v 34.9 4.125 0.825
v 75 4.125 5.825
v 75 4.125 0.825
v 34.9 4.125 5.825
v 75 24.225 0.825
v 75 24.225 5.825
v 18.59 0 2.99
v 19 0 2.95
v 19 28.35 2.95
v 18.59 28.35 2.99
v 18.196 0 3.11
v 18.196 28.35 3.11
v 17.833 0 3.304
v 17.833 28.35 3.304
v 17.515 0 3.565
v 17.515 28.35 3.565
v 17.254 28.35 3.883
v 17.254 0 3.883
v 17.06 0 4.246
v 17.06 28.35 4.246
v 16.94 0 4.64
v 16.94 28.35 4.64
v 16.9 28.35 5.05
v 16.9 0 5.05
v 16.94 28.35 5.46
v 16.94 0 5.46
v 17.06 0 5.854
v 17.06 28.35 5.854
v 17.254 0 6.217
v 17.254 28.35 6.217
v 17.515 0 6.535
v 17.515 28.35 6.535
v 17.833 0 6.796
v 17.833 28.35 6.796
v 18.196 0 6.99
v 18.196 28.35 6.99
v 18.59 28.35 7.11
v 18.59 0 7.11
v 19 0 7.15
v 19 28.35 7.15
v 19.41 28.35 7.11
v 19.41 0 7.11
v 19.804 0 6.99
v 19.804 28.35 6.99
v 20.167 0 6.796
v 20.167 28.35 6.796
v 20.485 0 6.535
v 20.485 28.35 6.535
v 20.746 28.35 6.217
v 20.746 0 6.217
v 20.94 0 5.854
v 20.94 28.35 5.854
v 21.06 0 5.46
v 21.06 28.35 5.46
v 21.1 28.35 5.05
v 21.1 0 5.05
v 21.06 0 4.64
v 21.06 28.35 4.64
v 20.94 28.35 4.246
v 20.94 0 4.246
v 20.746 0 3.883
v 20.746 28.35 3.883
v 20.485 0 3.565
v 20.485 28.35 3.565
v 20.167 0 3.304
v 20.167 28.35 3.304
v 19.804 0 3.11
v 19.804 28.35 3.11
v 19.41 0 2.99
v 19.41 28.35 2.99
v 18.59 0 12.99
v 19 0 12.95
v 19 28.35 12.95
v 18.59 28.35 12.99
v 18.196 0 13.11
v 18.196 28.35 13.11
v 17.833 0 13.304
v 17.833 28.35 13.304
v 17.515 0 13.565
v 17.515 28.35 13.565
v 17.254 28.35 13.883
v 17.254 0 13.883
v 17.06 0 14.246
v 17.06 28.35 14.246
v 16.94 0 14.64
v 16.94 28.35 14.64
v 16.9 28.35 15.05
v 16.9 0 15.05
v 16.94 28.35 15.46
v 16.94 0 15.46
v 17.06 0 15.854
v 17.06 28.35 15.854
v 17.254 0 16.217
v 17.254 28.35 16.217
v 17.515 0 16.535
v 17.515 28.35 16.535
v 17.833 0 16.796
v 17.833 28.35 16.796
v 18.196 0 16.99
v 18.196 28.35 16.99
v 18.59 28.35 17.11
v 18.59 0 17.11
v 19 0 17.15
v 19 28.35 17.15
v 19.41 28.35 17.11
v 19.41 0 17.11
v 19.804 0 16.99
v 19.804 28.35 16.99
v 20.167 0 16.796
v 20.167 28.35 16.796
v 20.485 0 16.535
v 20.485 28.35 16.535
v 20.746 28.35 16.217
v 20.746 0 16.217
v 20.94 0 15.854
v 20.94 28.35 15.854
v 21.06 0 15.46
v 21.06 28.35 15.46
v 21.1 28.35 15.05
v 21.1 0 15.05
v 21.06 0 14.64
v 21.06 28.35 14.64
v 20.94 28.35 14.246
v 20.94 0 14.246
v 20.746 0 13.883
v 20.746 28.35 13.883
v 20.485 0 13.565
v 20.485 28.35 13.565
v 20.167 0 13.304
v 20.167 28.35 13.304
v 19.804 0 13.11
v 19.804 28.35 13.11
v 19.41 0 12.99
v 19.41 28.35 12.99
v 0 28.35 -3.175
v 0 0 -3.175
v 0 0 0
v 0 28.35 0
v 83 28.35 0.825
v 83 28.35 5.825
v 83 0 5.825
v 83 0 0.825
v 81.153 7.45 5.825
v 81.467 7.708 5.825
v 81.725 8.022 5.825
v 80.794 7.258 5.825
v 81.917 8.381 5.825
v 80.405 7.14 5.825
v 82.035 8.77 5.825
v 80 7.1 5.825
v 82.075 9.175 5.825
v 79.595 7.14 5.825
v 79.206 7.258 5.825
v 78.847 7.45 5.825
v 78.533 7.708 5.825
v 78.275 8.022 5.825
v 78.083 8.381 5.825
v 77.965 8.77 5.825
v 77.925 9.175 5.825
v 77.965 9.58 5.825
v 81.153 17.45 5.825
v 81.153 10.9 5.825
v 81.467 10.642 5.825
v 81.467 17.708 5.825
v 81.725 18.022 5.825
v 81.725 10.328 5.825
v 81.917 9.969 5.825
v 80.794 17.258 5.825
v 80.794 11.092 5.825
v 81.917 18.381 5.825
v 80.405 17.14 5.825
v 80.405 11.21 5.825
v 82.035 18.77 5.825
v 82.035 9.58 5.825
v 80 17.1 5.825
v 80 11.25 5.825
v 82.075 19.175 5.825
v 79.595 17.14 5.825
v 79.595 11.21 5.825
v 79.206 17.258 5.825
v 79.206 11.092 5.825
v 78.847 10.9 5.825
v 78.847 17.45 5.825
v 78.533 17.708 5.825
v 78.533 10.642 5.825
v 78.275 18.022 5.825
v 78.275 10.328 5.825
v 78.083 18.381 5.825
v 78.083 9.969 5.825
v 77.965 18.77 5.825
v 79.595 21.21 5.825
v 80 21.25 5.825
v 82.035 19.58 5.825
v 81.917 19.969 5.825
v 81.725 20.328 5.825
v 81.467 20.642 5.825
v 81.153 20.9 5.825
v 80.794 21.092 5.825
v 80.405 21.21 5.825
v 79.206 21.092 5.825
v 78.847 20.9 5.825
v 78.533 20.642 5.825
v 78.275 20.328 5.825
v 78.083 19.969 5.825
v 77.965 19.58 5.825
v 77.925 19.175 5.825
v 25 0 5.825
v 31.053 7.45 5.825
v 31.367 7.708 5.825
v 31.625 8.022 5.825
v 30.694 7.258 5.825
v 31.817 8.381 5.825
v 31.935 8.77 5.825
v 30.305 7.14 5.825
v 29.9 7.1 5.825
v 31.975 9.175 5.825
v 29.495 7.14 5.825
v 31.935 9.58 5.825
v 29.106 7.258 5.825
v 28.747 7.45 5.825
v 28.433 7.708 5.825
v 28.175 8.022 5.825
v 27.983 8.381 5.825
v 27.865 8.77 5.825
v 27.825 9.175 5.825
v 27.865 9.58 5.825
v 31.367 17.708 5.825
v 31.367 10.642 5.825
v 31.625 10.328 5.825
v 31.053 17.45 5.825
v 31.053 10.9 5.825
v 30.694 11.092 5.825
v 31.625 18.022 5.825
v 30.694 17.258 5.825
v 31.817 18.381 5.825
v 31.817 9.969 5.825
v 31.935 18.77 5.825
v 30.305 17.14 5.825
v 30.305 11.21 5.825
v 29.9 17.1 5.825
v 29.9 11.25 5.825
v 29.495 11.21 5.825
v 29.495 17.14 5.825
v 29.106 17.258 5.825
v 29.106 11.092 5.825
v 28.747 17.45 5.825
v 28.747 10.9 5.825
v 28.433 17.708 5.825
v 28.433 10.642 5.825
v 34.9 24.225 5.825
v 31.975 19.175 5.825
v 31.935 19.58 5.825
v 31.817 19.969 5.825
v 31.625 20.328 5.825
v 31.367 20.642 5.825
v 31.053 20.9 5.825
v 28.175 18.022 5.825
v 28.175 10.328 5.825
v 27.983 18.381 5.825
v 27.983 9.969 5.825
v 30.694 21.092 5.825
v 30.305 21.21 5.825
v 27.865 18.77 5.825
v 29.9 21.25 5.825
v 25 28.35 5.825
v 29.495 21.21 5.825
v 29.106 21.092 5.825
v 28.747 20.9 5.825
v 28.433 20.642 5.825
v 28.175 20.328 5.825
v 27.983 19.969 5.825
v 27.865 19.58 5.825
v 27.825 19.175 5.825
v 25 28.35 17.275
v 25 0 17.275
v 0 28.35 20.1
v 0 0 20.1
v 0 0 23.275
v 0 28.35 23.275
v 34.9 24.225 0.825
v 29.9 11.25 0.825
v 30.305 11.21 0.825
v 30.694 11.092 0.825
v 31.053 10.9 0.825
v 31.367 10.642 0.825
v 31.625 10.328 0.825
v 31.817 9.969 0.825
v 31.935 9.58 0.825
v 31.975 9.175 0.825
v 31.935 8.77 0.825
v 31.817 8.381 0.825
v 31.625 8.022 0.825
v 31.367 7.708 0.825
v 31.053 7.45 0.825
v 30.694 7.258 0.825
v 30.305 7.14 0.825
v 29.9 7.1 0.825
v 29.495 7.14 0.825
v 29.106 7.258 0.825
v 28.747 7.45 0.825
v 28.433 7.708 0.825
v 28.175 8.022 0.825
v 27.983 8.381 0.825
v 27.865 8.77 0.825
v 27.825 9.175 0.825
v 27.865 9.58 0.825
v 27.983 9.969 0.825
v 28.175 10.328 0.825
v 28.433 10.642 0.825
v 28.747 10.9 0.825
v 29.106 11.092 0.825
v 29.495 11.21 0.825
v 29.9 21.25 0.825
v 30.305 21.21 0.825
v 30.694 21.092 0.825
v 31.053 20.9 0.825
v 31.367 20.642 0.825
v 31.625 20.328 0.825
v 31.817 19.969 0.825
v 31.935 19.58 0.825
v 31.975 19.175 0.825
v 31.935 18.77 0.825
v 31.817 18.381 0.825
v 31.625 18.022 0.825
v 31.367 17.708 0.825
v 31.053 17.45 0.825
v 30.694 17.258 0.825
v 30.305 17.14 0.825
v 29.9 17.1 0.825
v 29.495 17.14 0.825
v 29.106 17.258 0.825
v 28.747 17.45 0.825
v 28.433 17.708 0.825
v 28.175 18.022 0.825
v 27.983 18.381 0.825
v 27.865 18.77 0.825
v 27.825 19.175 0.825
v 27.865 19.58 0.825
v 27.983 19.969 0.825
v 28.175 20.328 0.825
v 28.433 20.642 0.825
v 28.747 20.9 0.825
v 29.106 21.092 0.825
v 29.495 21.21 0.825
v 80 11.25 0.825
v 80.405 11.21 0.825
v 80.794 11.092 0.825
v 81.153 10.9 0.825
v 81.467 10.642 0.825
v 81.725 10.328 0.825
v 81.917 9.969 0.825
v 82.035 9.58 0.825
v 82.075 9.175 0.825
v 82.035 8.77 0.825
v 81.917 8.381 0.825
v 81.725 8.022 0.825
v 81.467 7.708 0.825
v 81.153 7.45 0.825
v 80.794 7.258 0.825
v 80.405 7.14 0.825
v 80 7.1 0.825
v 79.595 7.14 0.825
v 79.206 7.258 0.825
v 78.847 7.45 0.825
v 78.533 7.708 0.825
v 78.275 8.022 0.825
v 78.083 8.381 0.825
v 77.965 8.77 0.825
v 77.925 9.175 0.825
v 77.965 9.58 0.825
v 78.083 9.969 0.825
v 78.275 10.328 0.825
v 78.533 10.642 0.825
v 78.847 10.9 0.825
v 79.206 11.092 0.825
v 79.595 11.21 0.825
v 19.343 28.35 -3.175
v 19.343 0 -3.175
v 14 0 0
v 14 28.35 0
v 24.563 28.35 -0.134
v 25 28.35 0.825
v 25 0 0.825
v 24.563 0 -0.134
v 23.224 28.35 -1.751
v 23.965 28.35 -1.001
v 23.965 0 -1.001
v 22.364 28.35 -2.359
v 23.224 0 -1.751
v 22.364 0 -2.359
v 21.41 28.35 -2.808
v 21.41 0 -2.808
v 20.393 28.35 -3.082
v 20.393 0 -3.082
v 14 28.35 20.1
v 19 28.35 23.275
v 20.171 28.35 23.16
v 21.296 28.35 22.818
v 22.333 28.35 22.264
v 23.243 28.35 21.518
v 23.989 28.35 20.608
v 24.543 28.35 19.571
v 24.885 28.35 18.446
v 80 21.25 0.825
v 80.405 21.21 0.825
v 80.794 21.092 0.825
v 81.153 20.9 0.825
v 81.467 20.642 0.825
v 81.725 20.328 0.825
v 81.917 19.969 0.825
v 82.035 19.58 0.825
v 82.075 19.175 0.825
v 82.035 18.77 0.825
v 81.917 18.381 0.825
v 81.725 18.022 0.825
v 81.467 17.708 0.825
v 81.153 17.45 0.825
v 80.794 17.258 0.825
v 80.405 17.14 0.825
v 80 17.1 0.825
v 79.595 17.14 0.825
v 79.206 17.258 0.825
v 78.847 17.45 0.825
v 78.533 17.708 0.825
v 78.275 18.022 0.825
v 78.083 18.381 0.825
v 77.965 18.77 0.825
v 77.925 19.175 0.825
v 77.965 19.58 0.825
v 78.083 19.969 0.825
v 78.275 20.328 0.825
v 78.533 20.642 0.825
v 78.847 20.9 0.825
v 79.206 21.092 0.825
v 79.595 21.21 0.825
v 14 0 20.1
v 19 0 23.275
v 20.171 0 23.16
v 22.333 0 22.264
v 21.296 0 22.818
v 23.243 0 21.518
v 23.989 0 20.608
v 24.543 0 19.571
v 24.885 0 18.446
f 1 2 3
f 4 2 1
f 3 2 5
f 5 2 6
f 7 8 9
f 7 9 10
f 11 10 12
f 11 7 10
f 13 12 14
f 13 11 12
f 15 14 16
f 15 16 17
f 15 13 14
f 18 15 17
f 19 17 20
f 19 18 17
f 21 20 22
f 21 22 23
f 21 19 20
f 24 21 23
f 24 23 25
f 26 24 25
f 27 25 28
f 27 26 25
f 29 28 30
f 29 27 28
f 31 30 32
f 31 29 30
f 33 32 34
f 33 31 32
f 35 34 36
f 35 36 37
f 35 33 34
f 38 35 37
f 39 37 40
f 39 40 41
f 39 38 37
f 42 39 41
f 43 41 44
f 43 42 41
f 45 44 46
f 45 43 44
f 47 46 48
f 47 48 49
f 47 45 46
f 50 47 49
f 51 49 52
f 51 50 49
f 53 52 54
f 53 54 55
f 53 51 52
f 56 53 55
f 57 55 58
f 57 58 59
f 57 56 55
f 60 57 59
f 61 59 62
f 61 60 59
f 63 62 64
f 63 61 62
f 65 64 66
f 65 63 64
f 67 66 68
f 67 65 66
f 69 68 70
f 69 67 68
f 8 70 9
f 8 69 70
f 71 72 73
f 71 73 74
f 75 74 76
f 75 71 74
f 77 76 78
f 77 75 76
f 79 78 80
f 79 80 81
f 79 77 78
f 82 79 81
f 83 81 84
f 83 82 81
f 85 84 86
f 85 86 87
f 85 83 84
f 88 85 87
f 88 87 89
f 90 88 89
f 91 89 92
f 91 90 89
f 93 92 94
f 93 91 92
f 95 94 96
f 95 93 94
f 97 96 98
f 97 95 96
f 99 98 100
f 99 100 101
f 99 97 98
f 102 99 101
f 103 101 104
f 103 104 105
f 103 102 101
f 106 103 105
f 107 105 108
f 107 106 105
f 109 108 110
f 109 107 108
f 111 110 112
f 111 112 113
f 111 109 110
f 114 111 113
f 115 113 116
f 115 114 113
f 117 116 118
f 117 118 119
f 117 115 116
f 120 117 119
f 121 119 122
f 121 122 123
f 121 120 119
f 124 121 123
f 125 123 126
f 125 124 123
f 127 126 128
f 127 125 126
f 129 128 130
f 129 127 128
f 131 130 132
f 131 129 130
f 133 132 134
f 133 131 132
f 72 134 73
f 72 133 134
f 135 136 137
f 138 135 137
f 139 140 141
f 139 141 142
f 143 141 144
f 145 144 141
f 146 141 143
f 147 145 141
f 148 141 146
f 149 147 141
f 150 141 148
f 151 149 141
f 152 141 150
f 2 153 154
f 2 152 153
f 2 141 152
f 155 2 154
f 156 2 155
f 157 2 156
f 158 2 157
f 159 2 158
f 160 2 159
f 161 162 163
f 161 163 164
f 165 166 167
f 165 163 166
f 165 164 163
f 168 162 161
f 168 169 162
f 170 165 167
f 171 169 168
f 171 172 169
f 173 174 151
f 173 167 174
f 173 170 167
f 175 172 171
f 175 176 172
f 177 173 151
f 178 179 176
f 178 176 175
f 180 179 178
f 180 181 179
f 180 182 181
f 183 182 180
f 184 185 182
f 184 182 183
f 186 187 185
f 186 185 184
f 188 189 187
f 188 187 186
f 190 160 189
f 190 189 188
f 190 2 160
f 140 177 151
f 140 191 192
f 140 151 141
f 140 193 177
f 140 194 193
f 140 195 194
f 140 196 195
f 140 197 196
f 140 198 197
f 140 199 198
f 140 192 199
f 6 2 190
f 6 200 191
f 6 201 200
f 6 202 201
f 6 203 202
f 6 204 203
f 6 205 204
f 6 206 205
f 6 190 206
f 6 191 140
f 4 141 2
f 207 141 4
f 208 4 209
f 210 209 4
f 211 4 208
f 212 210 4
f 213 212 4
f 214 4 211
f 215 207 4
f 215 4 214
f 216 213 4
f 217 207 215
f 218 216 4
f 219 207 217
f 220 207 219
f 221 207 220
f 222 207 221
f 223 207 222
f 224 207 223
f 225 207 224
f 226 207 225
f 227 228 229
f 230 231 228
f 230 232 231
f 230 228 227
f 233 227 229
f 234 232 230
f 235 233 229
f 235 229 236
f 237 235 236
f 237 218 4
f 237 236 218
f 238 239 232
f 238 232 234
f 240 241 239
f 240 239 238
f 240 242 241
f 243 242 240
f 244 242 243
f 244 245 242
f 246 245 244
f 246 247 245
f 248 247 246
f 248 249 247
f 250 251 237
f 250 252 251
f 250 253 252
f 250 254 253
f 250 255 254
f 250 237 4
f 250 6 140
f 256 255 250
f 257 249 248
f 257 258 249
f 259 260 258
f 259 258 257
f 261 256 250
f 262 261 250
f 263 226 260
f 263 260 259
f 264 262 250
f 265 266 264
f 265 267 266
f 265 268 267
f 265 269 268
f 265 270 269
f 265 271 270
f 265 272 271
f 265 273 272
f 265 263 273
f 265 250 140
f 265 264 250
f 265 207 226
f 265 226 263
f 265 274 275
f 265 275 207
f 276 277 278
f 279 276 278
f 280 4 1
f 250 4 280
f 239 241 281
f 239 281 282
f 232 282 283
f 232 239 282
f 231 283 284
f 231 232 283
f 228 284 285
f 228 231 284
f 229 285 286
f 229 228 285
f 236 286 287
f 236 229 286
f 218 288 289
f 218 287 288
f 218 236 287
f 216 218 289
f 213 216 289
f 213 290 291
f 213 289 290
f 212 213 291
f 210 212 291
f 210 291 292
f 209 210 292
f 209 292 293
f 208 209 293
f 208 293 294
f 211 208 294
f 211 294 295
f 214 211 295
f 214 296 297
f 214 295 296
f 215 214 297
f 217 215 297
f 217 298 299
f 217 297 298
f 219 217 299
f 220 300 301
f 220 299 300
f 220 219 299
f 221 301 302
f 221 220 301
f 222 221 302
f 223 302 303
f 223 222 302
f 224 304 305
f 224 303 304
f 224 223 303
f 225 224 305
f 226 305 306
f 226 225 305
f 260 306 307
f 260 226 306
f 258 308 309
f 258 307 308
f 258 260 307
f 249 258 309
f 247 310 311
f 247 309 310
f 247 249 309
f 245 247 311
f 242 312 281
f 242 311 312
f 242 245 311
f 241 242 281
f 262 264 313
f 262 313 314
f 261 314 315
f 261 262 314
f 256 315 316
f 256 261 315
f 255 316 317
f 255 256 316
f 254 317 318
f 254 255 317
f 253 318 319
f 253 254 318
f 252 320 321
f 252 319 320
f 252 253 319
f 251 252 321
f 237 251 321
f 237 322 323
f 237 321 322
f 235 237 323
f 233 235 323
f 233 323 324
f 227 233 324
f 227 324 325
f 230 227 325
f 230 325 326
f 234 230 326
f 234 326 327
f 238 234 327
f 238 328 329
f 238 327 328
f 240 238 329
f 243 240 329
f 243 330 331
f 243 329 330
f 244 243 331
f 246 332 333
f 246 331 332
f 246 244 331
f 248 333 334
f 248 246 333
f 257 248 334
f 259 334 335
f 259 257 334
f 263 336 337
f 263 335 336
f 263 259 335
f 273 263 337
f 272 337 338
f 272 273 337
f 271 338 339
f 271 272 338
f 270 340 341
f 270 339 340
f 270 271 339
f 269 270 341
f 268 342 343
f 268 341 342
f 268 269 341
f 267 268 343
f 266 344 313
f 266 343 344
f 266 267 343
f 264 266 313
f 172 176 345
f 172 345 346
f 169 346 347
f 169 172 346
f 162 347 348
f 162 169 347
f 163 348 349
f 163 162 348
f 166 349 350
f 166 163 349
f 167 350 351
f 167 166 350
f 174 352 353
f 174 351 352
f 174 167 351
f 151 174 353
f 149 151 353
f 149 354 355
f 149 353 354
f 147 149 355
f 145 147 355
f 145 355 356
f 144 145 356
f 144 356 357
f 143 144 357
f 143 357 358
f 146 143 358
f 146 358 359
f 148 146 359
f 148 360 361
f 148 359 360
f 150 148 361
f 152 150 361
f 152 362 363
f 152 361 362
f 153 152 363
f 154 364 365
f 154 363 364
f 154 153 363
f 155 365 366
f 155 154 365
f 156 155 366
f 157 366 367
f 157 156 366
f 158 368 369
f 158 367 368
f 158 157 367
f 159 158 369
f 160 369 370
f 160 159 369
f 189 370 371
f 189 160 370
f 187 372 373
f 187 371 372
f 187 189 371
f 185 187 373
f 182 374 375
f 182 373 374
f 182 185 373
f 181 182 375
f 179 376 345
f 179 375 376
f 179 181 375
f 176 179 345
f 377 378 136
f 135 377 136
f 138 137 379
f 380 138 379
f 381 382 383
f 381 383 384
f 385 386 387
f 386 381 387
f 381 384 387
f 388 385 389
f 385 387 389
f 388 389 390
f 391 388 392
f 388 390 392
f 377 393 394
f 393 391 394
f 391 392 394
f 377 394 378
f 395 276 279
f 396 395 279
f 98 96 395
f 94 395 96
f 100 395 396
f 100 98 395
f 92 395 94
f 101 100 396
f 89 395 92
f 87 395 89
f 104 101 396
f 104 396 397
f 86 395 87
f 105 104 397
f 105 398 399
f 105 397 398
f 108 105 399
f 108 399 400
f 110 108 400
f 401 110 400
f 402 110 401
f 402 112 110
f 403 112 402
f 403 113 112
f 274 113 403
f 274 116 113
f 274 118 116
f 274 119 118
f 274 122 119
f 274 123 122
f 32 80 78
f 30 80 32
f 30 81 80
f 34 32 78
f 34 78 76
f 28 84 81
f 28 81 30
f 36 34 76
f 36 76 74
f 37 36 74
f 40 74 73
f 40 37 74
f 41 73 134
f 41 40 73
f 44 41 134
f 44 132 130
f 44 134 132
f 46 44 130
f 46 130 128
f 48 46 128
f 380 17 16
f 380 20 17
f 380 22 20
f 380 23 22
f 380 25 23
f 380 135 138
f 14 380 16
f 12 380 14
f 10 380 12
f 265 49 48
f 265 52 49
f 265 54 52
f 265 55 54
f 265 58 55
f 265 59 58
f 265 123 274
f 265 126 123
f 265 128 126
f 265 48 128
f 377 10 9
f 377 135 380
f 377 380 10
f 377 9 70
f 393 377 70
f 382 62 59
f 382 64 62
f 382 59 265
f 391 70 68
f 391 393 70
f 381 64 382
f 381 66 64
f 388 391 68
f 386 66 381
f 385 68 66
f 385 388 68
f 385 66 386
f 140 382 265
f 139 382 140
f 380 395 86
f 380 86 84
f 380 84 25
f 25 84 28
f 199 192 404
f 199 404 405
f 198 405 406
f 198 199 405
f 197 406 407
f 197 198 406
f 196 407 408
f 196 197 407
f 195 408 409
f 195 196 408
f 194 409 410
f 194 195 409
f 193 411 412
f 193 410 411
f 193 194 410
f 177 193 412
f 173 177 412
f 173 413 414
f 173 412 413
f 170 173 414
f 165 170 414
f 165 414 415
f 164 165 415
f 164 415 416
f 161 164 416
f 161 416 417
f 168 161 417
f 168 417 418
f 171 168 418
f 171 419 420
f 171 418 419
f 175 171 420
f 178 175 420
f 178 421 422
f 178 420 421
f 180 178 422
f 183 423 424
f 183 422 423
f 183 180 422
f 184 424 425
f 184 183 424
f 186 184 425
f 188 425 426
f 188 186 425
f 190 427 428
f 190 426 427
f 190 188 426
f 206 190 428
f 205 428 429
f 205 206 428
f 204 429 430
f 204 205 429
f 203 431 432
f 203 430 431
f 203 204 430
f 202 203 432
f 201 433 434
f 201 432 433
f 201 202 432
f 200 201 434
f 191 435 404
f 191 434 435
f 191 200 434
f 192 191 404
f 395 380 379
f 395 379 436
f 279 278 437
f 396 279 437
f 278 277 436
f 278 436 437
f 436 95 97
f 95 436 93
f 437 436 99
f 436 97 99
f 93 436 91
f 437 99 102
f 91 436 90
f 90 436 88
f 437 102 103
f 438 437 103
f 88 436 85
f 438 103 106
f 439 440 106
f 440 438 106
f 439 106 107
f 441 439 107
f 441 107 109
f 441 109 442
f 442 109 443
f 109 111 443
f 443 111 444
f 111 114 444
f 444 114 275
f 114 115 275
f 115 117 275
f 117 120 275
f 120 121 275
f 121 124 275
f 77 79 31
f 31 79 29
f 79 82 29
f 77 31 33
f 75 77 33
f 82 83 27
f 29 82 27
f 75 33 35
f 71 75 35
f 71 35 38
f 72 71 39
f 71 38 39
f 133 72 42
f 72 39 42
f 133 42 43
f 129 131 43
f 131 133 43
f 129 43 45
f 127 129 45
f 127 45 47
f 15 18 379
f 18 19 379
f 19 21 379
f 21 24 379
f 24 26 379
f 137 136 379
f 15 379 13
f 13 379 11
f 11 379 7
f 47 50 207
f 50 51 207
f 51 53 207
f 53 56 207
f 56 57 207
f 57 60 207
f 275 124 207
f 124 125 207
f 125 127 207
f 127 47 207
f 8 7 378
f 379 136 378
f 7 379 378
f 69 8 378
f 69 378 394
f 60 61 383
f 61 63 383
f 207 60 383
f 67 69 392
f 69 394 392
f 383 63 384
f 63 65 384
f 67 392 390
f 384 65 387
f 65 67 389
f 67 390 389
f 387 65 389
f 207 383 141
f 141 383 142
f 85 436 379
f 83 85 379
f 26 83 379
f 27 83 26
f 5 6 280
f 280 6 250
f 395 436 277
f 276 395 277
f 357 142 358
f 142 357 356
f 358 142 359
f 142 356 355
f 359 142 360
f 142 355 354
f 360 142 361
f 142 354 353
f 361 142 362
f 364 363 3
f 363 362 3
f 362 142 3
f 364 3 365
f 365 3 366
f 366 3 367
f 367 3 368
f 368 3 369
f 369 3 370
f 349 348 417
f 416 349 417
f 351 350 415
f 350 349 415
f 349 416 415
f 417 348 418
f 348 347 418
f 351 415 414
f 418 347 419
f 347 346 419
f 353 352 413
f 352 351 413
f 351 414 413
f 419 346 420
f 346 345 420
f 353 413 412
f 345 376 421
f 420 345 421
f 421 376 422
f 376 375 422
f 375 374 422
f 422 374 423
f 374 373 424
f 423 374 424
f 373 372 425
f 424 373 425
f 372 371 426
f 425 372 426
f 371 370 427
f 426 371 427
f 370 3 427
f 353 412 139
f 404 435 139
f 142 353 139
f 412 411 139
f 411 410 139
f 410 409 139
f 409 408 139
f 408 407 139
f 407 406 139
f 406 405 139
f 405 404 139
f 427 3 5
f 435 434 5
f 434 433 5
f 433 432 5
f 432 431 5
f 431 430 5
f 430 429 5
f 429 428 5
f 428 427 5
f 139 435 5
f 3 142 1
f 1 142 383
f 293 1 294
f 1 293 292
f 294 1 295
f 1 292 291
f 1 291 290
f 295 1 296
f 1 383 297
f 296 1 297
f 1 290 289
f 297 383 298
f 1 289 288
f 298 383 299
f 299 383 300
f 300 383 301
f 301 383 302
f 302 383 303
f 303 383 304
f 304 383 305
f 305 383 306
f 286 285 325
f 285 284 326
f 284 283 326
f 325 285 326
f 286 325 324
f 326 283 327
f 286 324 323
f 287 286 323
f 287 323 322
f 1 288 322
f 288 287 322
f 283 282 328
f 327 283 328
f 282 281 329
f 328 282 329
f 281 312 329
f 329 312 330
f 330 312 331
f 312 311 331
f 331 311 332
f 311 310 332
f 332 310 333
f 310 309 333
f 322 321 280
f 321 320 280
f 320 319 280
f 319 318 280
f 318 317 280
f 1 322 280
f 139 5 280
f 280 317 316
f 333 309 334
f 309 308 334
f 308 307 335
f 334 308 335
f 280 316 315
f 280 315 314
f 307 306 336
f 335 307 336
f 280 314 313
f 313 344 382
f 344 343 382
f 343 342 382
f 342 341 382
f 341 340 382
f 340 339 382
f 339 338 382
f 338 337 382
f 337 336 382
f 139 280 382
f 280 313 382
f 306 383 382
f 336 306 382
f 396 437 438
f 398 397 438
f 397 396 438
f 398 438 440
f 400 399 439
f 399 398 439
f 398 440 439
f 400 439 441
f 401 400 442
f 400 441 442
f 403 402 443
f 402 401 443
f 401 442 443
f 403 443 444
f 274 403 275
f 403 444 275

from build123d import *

# Parameters (mm, degrees)
SKETCH1_R               = 2.1
BOSS_EXTRUDE1_DEPTH     = 28.35
SKETCH2_W               = 5
SKETCH2_H               = 28.35
BOSS_EXTRUDE2_DEPTH     = 58
CUT_EXTRUDE1_DEPTH      = 91.535766413
CUT_EXTRUDE1_DEPTH_BACK = 91.535766413
SKETCH3_W               = 40.1
SKETCH3_H               = 20.1
CUT_EXTRUDE2_DEPTH      = 91.535766413
CUT_EXTRUDE2_DEPTH_BACK = 91.535766413
SKETCH4_R               = 2.075
FILLET1_R               = 6


with BuildPart() as part:
    # Sketch1 → Boss-Extrude1 (new body)
    with BuildSketch(Plane(origin=(0, 0, 0), x_dir=(1, 0, 0), z_dir=(0, 1, 0))):
        Polygon((0, 0), (14, 0), (14, -20.1), (0, -20.1), (0, -23.275), (25, -23.275), (25, 3.175), (0, 3.175), align=None)
        with Locations(Location((19, -5.05, 0), (0, 0, 90))):
            Circle(SKETCH1_R, mode=Mode.SUBTRACT)
        with Locations(Location((19, -15.05, 0), (0, 0, 90))):
            Circle(SKETCH1_R, mode=Mode.SUBTRACT)
    extrude(amount=BOSS_EXTRUDE1_DEPTH)

    # Sketch2 → Boss-Extrude2 (add)
    with BuildSketch(Plane(origin=(25, 0, 0), x_dir=(0, 0, -1), z_dir=(1, 0, 0))):
        with Locations((-3.325, 14.175)):
            Rectangle(SKETCH2_W, SKETCH2_H)
    extrude(amount=BOSS_EXTRUDE2_DEPTH)

    # Sketch3 → Cut-Extrude1 (cut, two sides: drawn at the far end of the back side and taken through both)
    with BuildSketch(Plane(origin=(0, 0, 0.825), x_dir=(-1, 0, 0), z_dir=(0, 0, -1)).offset(-CUT_EXTRUDE1_DEPTH_BACK)):
        with Locations((-54.95, 14.175)):
            Rectangle(SKETCH3_W, SKETCH3_H)
    extrude(amount=CUT_EXTRUDE1_DEPTH + CUT_EXTRUDE1_DEPTH_BACK, mode=Mode.SUBTRACT)

    # Sketch4 → Cut-Extrude2 (cut, two sides: drawn at the far end of the back side and taken through both)
    with BuildSketch(Plane(origin=(0, 0, 0.825), x_dir=(-1, 0, 0), z_dir=(0, 0, -1)).offset(-CUT_EXTRUDE2_DEPTH_BACK)):
        with Locations(Location((-29.9, 19.175, 0), (0, 0, 90))):
            Circle(SKETCH4_R)
        with Locations(Location((-29.9, 9.175, 0), (0, 0, 90))):
            Circle(SKETCH4_R)
        with Locations(Location((-80, 19.175, 0), (0, 0, 90))):
            Circle(SKETCH4_R)
        with Locations(Location((-80, 9.175, 0), (0, 0, 90))):
            Circle(SKETCH4_R)
    extrude(amount=CUT_EXTRUDE2_DEPTH + CUT_EXTRUDE2_DEPTH_BACK, mode=Mode.SUBTRACT)

    # Fillet1
    # the kernel refuses this fillet: 6 mm, written as the material it takes off along each edge
    with BuildSketch(Plane(origin=(25, -14.142135624, -3.175), x_dir=(-1, 0, 0), z_dir=(0, 1, 0))) as fillet1_piece_1:
        with BuildLine():
            CenterArc((5.656854249, 6), FILLET1_R, 199.471220634, 70.528779366)
            Line((0, 4), (-0.113137085, 3.96))
            ThreePointArc((-0.113137085, 3.96), (-0.12, 2), (-0.12, 0))
            Line((-0.12, 0), (0, -0.12))
            Line((0, -0.12), (5.656854249, -0.12))
            Line((5.656854249, -0.12), (5.656854249, 0))
        make_face()
    extrude(amount=56.634271247, mode=Mode.SUBTRACT)
    with BuildSketch(Plane(origin=(25, -15, 23.275), x_dir=(-1, 0, 0), z_dir=(0, 1, 0))) as fillet1_piece_2:
        with BuildLine():
            CenterArc((FILLET1_R, -FILLET1_R), FILLET1_R, 90, 90)
            Line((0, -FILLET1_R), (-FILLET1_R * 0.02, -FILLET1_R))
            Line((-FILLET1_R * 0.02, -FILLET1_R), (-FILLET1_R * 0.02, FILLET1_R * 0.02))
            Line((-FILLET1_R * 0.02, FILLET1_R * 0.02), (FILLET1_R, FILLET1_R * 0.02))
            Line((FILLET1_R, FILLET1_R * 0.02), (FILLET1_R, 0))
        make_face()
    extrude(amount=58.35, mode=Mode.SUBTRACT)


solid = part.part
